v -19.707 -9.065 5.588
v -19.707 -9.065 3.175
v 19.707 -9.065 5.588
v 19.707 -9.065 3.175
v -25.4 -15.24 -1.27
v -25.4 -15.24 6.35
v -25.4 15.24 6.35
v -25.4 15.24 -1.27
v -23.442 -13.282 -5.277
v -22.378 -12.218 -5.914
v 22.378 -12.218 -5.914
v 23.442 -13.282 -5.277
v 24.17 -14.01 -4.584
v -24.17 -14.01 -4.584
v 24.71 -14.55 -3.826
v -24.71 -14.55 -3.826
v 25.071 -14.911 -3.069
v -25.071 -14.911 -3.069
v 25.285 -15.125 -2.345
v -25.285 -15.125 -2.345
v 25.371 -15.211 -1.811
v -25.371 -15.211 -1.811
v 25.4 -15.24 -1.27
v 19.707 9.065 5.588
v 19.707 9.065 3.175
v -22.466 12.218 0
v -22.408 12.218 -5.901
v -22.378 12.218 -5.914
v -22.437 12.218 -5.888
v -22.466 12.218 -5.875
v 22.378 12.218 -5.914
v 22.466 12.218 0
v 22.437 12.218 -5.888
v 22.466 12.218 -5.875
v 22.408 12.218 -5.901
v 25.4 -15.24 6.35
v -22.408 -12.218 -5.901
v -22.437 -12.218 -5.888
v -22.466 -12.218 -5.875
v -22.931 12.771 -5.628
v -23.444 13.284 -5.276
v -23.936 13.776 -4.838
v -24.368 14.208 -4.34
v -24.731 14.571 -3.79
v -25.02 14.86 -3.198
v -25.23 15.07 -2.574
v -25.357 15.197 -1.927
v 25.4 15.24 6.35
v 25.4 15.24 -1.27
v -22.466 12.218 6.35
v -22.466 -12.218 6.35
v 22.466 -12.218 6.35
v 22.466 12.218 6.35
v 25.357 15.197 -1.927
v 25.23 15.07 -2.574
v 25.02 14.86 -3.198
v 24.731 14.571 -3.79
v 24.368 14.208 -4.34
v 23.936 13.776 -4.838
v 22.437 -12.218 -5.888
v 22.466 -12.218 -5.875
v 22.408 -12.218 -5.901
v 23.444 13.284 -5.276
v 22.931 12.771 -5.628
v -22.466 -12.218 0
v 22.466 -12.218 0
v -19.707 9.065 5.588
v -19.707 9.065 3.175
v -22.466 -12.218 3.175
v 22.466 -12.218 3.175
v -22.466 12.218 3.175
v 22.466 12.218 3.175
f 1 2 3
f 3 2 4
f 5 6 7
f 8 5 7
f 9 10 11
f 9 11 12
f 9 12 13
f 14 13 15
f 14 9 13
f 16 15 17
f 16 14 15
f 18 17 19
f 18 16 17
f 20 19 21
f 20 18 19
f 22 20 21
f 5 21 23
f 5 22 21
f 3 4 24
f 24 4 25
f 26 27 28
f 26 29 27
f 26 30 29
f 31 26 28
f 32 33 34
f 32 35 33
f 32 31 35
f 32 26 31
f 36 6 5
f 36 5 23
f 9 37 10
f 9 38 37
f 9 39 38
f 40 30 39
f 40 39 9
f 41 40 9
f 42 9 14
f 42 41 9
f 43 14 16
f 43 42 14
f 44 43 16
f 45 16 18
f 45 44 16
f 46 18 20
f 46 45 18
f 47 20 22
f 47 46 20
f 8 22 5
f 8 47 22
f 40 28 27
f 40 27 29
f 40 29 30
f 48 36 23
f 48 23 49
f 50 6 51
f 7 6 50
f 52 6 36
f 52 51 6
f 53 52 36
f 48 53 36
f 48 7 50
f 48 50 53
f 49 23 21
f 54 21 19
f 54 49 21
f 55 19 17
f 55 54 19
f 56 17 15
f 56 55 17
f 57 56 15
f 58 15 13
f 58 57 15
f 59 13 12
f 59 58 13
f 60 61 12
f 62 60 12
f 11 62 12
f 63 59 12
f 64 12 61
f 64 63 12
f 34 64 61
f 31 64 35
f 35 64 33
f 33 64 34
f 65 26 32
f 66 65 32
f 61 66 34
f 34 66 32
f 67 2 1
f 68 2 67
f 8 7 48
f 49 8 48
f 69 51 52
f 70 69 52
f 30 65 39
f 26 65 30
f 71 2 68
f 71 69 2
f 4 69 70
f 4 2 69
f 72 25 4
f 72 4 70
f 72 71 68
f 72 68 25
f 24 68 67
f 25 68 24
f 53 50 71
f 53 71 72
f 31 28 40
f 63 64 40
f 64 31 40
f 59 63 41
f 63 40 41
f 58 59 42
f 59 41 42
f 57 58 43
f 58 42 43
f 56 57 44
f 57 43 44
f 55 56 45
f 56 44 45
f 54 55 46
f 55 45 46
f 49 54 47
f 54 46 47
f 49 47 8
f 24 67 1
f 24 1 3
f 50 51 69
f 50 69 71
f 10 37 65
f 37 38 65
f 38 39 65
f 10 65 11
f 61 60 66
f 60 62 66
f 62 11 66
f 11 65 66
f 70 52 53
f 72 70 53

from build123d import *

# Parameters (mm, degrees)
F0_W        = 50.8
F0_H        = 30.48
F0_W_2      = 44.9317246675
F0_H_2      = 24.4365520775
F1_DEPTH    = 6.35
F0_W_3      = 39.4137948751
F0_H_3      = 18.13034527
F2_DEPTH    = 3.175
F3_DEPTH    = 5.588
F4_T1_DEPTH = 76.2
F4_T3_DEPTH = 55.88


# Not quite as in the source:
# - a fillet or chamfer that OpenCascade refuses, or shapes differently, is made with other operations: its cross-section is extruded or revolved along the edge and cut away or added


with BuildPart() as f1:
    # F0 (on Top) → F1 (new body, symmetric)
    with BuildSketch(Plane.XY):
        Rectangle(F0_W, F0_H)
        Rectangle(F0_W_2, F0_H_2, mode=Mode.SUBTRACT)
    extrude(amount=F1_DEPTH, both=True)

    # F0 (on Top) → F2 (join)
    with BuildSketch(Plane.XY):
        Rectangle(F0_W_2, F0_H_2)
        Rectangle(F0_W_3, F0_H_3, mode=Mode.SUBTRACT)
    extrude(amount=F2_DEPTH)

    # F0 (on Top) → F3 (join)
    with BuildSketch(Plane.XY):
        Rectangle(F0_W_3, F0_H_3)
    extrude(amount=F3_DEPTH)

    # F4: fillet of radius 5.08 on 4 edges, made by hand

    # F4_s2 → F4_t1 (cut)
    with BuildSketch(Plane.YZ.offset(-38.1)):
        with BuildLine():
            ThreePointArc((-10.16, -6.35), (-13.7521024484, -4.8621024484), (-15.24, -1.27))
            Line((-15.24, -1.27), (-15.24, -6.35))
            Line((-15.24, -6.35), (-10.16, -6.35))
        make_face()
        with BuildLine():
            ThreePointArc((10.16, -6.35), (13.7521024484, -4.8621024484), (15.24, -1.27))
            Line((15.24, -1.27), (15.24, -6.35))
            Line((15.24, -6.35), (10.16, -6.35))
        make_face()
    extrude(amount=F4_T1_DEPTH, mode=Mode.SUBTRACT)

    # F4_s4 → F4_t3 (cut)
    with BuildSketch(Plane.XZ.offset(-27.94)):
        with BuildLine():
            ThreePointArc((25.4, -1.27), (23.9121024484, -4.8621024484), (20.32, -6.35))
            Line((20.32, -6.35), (25.4, -6.35))
            Line((25.4, -6.35), (25.4, -1.27))
        make_face()
        with BuildLine():
            ThreePointArc((-20.32, -6.35), (-23.9121024484, -4.8621024484), (-25.4, -1.27))
            Line((-25.4, -1.27), (-25.4, -6.35))
            Line((-25.4, -6.35), (-20.32, -6.35))
        make_face()
    extrude(amount=F4_T3_DEPTH, mode=Mode.SUBTRACT)


solid = f1.part
